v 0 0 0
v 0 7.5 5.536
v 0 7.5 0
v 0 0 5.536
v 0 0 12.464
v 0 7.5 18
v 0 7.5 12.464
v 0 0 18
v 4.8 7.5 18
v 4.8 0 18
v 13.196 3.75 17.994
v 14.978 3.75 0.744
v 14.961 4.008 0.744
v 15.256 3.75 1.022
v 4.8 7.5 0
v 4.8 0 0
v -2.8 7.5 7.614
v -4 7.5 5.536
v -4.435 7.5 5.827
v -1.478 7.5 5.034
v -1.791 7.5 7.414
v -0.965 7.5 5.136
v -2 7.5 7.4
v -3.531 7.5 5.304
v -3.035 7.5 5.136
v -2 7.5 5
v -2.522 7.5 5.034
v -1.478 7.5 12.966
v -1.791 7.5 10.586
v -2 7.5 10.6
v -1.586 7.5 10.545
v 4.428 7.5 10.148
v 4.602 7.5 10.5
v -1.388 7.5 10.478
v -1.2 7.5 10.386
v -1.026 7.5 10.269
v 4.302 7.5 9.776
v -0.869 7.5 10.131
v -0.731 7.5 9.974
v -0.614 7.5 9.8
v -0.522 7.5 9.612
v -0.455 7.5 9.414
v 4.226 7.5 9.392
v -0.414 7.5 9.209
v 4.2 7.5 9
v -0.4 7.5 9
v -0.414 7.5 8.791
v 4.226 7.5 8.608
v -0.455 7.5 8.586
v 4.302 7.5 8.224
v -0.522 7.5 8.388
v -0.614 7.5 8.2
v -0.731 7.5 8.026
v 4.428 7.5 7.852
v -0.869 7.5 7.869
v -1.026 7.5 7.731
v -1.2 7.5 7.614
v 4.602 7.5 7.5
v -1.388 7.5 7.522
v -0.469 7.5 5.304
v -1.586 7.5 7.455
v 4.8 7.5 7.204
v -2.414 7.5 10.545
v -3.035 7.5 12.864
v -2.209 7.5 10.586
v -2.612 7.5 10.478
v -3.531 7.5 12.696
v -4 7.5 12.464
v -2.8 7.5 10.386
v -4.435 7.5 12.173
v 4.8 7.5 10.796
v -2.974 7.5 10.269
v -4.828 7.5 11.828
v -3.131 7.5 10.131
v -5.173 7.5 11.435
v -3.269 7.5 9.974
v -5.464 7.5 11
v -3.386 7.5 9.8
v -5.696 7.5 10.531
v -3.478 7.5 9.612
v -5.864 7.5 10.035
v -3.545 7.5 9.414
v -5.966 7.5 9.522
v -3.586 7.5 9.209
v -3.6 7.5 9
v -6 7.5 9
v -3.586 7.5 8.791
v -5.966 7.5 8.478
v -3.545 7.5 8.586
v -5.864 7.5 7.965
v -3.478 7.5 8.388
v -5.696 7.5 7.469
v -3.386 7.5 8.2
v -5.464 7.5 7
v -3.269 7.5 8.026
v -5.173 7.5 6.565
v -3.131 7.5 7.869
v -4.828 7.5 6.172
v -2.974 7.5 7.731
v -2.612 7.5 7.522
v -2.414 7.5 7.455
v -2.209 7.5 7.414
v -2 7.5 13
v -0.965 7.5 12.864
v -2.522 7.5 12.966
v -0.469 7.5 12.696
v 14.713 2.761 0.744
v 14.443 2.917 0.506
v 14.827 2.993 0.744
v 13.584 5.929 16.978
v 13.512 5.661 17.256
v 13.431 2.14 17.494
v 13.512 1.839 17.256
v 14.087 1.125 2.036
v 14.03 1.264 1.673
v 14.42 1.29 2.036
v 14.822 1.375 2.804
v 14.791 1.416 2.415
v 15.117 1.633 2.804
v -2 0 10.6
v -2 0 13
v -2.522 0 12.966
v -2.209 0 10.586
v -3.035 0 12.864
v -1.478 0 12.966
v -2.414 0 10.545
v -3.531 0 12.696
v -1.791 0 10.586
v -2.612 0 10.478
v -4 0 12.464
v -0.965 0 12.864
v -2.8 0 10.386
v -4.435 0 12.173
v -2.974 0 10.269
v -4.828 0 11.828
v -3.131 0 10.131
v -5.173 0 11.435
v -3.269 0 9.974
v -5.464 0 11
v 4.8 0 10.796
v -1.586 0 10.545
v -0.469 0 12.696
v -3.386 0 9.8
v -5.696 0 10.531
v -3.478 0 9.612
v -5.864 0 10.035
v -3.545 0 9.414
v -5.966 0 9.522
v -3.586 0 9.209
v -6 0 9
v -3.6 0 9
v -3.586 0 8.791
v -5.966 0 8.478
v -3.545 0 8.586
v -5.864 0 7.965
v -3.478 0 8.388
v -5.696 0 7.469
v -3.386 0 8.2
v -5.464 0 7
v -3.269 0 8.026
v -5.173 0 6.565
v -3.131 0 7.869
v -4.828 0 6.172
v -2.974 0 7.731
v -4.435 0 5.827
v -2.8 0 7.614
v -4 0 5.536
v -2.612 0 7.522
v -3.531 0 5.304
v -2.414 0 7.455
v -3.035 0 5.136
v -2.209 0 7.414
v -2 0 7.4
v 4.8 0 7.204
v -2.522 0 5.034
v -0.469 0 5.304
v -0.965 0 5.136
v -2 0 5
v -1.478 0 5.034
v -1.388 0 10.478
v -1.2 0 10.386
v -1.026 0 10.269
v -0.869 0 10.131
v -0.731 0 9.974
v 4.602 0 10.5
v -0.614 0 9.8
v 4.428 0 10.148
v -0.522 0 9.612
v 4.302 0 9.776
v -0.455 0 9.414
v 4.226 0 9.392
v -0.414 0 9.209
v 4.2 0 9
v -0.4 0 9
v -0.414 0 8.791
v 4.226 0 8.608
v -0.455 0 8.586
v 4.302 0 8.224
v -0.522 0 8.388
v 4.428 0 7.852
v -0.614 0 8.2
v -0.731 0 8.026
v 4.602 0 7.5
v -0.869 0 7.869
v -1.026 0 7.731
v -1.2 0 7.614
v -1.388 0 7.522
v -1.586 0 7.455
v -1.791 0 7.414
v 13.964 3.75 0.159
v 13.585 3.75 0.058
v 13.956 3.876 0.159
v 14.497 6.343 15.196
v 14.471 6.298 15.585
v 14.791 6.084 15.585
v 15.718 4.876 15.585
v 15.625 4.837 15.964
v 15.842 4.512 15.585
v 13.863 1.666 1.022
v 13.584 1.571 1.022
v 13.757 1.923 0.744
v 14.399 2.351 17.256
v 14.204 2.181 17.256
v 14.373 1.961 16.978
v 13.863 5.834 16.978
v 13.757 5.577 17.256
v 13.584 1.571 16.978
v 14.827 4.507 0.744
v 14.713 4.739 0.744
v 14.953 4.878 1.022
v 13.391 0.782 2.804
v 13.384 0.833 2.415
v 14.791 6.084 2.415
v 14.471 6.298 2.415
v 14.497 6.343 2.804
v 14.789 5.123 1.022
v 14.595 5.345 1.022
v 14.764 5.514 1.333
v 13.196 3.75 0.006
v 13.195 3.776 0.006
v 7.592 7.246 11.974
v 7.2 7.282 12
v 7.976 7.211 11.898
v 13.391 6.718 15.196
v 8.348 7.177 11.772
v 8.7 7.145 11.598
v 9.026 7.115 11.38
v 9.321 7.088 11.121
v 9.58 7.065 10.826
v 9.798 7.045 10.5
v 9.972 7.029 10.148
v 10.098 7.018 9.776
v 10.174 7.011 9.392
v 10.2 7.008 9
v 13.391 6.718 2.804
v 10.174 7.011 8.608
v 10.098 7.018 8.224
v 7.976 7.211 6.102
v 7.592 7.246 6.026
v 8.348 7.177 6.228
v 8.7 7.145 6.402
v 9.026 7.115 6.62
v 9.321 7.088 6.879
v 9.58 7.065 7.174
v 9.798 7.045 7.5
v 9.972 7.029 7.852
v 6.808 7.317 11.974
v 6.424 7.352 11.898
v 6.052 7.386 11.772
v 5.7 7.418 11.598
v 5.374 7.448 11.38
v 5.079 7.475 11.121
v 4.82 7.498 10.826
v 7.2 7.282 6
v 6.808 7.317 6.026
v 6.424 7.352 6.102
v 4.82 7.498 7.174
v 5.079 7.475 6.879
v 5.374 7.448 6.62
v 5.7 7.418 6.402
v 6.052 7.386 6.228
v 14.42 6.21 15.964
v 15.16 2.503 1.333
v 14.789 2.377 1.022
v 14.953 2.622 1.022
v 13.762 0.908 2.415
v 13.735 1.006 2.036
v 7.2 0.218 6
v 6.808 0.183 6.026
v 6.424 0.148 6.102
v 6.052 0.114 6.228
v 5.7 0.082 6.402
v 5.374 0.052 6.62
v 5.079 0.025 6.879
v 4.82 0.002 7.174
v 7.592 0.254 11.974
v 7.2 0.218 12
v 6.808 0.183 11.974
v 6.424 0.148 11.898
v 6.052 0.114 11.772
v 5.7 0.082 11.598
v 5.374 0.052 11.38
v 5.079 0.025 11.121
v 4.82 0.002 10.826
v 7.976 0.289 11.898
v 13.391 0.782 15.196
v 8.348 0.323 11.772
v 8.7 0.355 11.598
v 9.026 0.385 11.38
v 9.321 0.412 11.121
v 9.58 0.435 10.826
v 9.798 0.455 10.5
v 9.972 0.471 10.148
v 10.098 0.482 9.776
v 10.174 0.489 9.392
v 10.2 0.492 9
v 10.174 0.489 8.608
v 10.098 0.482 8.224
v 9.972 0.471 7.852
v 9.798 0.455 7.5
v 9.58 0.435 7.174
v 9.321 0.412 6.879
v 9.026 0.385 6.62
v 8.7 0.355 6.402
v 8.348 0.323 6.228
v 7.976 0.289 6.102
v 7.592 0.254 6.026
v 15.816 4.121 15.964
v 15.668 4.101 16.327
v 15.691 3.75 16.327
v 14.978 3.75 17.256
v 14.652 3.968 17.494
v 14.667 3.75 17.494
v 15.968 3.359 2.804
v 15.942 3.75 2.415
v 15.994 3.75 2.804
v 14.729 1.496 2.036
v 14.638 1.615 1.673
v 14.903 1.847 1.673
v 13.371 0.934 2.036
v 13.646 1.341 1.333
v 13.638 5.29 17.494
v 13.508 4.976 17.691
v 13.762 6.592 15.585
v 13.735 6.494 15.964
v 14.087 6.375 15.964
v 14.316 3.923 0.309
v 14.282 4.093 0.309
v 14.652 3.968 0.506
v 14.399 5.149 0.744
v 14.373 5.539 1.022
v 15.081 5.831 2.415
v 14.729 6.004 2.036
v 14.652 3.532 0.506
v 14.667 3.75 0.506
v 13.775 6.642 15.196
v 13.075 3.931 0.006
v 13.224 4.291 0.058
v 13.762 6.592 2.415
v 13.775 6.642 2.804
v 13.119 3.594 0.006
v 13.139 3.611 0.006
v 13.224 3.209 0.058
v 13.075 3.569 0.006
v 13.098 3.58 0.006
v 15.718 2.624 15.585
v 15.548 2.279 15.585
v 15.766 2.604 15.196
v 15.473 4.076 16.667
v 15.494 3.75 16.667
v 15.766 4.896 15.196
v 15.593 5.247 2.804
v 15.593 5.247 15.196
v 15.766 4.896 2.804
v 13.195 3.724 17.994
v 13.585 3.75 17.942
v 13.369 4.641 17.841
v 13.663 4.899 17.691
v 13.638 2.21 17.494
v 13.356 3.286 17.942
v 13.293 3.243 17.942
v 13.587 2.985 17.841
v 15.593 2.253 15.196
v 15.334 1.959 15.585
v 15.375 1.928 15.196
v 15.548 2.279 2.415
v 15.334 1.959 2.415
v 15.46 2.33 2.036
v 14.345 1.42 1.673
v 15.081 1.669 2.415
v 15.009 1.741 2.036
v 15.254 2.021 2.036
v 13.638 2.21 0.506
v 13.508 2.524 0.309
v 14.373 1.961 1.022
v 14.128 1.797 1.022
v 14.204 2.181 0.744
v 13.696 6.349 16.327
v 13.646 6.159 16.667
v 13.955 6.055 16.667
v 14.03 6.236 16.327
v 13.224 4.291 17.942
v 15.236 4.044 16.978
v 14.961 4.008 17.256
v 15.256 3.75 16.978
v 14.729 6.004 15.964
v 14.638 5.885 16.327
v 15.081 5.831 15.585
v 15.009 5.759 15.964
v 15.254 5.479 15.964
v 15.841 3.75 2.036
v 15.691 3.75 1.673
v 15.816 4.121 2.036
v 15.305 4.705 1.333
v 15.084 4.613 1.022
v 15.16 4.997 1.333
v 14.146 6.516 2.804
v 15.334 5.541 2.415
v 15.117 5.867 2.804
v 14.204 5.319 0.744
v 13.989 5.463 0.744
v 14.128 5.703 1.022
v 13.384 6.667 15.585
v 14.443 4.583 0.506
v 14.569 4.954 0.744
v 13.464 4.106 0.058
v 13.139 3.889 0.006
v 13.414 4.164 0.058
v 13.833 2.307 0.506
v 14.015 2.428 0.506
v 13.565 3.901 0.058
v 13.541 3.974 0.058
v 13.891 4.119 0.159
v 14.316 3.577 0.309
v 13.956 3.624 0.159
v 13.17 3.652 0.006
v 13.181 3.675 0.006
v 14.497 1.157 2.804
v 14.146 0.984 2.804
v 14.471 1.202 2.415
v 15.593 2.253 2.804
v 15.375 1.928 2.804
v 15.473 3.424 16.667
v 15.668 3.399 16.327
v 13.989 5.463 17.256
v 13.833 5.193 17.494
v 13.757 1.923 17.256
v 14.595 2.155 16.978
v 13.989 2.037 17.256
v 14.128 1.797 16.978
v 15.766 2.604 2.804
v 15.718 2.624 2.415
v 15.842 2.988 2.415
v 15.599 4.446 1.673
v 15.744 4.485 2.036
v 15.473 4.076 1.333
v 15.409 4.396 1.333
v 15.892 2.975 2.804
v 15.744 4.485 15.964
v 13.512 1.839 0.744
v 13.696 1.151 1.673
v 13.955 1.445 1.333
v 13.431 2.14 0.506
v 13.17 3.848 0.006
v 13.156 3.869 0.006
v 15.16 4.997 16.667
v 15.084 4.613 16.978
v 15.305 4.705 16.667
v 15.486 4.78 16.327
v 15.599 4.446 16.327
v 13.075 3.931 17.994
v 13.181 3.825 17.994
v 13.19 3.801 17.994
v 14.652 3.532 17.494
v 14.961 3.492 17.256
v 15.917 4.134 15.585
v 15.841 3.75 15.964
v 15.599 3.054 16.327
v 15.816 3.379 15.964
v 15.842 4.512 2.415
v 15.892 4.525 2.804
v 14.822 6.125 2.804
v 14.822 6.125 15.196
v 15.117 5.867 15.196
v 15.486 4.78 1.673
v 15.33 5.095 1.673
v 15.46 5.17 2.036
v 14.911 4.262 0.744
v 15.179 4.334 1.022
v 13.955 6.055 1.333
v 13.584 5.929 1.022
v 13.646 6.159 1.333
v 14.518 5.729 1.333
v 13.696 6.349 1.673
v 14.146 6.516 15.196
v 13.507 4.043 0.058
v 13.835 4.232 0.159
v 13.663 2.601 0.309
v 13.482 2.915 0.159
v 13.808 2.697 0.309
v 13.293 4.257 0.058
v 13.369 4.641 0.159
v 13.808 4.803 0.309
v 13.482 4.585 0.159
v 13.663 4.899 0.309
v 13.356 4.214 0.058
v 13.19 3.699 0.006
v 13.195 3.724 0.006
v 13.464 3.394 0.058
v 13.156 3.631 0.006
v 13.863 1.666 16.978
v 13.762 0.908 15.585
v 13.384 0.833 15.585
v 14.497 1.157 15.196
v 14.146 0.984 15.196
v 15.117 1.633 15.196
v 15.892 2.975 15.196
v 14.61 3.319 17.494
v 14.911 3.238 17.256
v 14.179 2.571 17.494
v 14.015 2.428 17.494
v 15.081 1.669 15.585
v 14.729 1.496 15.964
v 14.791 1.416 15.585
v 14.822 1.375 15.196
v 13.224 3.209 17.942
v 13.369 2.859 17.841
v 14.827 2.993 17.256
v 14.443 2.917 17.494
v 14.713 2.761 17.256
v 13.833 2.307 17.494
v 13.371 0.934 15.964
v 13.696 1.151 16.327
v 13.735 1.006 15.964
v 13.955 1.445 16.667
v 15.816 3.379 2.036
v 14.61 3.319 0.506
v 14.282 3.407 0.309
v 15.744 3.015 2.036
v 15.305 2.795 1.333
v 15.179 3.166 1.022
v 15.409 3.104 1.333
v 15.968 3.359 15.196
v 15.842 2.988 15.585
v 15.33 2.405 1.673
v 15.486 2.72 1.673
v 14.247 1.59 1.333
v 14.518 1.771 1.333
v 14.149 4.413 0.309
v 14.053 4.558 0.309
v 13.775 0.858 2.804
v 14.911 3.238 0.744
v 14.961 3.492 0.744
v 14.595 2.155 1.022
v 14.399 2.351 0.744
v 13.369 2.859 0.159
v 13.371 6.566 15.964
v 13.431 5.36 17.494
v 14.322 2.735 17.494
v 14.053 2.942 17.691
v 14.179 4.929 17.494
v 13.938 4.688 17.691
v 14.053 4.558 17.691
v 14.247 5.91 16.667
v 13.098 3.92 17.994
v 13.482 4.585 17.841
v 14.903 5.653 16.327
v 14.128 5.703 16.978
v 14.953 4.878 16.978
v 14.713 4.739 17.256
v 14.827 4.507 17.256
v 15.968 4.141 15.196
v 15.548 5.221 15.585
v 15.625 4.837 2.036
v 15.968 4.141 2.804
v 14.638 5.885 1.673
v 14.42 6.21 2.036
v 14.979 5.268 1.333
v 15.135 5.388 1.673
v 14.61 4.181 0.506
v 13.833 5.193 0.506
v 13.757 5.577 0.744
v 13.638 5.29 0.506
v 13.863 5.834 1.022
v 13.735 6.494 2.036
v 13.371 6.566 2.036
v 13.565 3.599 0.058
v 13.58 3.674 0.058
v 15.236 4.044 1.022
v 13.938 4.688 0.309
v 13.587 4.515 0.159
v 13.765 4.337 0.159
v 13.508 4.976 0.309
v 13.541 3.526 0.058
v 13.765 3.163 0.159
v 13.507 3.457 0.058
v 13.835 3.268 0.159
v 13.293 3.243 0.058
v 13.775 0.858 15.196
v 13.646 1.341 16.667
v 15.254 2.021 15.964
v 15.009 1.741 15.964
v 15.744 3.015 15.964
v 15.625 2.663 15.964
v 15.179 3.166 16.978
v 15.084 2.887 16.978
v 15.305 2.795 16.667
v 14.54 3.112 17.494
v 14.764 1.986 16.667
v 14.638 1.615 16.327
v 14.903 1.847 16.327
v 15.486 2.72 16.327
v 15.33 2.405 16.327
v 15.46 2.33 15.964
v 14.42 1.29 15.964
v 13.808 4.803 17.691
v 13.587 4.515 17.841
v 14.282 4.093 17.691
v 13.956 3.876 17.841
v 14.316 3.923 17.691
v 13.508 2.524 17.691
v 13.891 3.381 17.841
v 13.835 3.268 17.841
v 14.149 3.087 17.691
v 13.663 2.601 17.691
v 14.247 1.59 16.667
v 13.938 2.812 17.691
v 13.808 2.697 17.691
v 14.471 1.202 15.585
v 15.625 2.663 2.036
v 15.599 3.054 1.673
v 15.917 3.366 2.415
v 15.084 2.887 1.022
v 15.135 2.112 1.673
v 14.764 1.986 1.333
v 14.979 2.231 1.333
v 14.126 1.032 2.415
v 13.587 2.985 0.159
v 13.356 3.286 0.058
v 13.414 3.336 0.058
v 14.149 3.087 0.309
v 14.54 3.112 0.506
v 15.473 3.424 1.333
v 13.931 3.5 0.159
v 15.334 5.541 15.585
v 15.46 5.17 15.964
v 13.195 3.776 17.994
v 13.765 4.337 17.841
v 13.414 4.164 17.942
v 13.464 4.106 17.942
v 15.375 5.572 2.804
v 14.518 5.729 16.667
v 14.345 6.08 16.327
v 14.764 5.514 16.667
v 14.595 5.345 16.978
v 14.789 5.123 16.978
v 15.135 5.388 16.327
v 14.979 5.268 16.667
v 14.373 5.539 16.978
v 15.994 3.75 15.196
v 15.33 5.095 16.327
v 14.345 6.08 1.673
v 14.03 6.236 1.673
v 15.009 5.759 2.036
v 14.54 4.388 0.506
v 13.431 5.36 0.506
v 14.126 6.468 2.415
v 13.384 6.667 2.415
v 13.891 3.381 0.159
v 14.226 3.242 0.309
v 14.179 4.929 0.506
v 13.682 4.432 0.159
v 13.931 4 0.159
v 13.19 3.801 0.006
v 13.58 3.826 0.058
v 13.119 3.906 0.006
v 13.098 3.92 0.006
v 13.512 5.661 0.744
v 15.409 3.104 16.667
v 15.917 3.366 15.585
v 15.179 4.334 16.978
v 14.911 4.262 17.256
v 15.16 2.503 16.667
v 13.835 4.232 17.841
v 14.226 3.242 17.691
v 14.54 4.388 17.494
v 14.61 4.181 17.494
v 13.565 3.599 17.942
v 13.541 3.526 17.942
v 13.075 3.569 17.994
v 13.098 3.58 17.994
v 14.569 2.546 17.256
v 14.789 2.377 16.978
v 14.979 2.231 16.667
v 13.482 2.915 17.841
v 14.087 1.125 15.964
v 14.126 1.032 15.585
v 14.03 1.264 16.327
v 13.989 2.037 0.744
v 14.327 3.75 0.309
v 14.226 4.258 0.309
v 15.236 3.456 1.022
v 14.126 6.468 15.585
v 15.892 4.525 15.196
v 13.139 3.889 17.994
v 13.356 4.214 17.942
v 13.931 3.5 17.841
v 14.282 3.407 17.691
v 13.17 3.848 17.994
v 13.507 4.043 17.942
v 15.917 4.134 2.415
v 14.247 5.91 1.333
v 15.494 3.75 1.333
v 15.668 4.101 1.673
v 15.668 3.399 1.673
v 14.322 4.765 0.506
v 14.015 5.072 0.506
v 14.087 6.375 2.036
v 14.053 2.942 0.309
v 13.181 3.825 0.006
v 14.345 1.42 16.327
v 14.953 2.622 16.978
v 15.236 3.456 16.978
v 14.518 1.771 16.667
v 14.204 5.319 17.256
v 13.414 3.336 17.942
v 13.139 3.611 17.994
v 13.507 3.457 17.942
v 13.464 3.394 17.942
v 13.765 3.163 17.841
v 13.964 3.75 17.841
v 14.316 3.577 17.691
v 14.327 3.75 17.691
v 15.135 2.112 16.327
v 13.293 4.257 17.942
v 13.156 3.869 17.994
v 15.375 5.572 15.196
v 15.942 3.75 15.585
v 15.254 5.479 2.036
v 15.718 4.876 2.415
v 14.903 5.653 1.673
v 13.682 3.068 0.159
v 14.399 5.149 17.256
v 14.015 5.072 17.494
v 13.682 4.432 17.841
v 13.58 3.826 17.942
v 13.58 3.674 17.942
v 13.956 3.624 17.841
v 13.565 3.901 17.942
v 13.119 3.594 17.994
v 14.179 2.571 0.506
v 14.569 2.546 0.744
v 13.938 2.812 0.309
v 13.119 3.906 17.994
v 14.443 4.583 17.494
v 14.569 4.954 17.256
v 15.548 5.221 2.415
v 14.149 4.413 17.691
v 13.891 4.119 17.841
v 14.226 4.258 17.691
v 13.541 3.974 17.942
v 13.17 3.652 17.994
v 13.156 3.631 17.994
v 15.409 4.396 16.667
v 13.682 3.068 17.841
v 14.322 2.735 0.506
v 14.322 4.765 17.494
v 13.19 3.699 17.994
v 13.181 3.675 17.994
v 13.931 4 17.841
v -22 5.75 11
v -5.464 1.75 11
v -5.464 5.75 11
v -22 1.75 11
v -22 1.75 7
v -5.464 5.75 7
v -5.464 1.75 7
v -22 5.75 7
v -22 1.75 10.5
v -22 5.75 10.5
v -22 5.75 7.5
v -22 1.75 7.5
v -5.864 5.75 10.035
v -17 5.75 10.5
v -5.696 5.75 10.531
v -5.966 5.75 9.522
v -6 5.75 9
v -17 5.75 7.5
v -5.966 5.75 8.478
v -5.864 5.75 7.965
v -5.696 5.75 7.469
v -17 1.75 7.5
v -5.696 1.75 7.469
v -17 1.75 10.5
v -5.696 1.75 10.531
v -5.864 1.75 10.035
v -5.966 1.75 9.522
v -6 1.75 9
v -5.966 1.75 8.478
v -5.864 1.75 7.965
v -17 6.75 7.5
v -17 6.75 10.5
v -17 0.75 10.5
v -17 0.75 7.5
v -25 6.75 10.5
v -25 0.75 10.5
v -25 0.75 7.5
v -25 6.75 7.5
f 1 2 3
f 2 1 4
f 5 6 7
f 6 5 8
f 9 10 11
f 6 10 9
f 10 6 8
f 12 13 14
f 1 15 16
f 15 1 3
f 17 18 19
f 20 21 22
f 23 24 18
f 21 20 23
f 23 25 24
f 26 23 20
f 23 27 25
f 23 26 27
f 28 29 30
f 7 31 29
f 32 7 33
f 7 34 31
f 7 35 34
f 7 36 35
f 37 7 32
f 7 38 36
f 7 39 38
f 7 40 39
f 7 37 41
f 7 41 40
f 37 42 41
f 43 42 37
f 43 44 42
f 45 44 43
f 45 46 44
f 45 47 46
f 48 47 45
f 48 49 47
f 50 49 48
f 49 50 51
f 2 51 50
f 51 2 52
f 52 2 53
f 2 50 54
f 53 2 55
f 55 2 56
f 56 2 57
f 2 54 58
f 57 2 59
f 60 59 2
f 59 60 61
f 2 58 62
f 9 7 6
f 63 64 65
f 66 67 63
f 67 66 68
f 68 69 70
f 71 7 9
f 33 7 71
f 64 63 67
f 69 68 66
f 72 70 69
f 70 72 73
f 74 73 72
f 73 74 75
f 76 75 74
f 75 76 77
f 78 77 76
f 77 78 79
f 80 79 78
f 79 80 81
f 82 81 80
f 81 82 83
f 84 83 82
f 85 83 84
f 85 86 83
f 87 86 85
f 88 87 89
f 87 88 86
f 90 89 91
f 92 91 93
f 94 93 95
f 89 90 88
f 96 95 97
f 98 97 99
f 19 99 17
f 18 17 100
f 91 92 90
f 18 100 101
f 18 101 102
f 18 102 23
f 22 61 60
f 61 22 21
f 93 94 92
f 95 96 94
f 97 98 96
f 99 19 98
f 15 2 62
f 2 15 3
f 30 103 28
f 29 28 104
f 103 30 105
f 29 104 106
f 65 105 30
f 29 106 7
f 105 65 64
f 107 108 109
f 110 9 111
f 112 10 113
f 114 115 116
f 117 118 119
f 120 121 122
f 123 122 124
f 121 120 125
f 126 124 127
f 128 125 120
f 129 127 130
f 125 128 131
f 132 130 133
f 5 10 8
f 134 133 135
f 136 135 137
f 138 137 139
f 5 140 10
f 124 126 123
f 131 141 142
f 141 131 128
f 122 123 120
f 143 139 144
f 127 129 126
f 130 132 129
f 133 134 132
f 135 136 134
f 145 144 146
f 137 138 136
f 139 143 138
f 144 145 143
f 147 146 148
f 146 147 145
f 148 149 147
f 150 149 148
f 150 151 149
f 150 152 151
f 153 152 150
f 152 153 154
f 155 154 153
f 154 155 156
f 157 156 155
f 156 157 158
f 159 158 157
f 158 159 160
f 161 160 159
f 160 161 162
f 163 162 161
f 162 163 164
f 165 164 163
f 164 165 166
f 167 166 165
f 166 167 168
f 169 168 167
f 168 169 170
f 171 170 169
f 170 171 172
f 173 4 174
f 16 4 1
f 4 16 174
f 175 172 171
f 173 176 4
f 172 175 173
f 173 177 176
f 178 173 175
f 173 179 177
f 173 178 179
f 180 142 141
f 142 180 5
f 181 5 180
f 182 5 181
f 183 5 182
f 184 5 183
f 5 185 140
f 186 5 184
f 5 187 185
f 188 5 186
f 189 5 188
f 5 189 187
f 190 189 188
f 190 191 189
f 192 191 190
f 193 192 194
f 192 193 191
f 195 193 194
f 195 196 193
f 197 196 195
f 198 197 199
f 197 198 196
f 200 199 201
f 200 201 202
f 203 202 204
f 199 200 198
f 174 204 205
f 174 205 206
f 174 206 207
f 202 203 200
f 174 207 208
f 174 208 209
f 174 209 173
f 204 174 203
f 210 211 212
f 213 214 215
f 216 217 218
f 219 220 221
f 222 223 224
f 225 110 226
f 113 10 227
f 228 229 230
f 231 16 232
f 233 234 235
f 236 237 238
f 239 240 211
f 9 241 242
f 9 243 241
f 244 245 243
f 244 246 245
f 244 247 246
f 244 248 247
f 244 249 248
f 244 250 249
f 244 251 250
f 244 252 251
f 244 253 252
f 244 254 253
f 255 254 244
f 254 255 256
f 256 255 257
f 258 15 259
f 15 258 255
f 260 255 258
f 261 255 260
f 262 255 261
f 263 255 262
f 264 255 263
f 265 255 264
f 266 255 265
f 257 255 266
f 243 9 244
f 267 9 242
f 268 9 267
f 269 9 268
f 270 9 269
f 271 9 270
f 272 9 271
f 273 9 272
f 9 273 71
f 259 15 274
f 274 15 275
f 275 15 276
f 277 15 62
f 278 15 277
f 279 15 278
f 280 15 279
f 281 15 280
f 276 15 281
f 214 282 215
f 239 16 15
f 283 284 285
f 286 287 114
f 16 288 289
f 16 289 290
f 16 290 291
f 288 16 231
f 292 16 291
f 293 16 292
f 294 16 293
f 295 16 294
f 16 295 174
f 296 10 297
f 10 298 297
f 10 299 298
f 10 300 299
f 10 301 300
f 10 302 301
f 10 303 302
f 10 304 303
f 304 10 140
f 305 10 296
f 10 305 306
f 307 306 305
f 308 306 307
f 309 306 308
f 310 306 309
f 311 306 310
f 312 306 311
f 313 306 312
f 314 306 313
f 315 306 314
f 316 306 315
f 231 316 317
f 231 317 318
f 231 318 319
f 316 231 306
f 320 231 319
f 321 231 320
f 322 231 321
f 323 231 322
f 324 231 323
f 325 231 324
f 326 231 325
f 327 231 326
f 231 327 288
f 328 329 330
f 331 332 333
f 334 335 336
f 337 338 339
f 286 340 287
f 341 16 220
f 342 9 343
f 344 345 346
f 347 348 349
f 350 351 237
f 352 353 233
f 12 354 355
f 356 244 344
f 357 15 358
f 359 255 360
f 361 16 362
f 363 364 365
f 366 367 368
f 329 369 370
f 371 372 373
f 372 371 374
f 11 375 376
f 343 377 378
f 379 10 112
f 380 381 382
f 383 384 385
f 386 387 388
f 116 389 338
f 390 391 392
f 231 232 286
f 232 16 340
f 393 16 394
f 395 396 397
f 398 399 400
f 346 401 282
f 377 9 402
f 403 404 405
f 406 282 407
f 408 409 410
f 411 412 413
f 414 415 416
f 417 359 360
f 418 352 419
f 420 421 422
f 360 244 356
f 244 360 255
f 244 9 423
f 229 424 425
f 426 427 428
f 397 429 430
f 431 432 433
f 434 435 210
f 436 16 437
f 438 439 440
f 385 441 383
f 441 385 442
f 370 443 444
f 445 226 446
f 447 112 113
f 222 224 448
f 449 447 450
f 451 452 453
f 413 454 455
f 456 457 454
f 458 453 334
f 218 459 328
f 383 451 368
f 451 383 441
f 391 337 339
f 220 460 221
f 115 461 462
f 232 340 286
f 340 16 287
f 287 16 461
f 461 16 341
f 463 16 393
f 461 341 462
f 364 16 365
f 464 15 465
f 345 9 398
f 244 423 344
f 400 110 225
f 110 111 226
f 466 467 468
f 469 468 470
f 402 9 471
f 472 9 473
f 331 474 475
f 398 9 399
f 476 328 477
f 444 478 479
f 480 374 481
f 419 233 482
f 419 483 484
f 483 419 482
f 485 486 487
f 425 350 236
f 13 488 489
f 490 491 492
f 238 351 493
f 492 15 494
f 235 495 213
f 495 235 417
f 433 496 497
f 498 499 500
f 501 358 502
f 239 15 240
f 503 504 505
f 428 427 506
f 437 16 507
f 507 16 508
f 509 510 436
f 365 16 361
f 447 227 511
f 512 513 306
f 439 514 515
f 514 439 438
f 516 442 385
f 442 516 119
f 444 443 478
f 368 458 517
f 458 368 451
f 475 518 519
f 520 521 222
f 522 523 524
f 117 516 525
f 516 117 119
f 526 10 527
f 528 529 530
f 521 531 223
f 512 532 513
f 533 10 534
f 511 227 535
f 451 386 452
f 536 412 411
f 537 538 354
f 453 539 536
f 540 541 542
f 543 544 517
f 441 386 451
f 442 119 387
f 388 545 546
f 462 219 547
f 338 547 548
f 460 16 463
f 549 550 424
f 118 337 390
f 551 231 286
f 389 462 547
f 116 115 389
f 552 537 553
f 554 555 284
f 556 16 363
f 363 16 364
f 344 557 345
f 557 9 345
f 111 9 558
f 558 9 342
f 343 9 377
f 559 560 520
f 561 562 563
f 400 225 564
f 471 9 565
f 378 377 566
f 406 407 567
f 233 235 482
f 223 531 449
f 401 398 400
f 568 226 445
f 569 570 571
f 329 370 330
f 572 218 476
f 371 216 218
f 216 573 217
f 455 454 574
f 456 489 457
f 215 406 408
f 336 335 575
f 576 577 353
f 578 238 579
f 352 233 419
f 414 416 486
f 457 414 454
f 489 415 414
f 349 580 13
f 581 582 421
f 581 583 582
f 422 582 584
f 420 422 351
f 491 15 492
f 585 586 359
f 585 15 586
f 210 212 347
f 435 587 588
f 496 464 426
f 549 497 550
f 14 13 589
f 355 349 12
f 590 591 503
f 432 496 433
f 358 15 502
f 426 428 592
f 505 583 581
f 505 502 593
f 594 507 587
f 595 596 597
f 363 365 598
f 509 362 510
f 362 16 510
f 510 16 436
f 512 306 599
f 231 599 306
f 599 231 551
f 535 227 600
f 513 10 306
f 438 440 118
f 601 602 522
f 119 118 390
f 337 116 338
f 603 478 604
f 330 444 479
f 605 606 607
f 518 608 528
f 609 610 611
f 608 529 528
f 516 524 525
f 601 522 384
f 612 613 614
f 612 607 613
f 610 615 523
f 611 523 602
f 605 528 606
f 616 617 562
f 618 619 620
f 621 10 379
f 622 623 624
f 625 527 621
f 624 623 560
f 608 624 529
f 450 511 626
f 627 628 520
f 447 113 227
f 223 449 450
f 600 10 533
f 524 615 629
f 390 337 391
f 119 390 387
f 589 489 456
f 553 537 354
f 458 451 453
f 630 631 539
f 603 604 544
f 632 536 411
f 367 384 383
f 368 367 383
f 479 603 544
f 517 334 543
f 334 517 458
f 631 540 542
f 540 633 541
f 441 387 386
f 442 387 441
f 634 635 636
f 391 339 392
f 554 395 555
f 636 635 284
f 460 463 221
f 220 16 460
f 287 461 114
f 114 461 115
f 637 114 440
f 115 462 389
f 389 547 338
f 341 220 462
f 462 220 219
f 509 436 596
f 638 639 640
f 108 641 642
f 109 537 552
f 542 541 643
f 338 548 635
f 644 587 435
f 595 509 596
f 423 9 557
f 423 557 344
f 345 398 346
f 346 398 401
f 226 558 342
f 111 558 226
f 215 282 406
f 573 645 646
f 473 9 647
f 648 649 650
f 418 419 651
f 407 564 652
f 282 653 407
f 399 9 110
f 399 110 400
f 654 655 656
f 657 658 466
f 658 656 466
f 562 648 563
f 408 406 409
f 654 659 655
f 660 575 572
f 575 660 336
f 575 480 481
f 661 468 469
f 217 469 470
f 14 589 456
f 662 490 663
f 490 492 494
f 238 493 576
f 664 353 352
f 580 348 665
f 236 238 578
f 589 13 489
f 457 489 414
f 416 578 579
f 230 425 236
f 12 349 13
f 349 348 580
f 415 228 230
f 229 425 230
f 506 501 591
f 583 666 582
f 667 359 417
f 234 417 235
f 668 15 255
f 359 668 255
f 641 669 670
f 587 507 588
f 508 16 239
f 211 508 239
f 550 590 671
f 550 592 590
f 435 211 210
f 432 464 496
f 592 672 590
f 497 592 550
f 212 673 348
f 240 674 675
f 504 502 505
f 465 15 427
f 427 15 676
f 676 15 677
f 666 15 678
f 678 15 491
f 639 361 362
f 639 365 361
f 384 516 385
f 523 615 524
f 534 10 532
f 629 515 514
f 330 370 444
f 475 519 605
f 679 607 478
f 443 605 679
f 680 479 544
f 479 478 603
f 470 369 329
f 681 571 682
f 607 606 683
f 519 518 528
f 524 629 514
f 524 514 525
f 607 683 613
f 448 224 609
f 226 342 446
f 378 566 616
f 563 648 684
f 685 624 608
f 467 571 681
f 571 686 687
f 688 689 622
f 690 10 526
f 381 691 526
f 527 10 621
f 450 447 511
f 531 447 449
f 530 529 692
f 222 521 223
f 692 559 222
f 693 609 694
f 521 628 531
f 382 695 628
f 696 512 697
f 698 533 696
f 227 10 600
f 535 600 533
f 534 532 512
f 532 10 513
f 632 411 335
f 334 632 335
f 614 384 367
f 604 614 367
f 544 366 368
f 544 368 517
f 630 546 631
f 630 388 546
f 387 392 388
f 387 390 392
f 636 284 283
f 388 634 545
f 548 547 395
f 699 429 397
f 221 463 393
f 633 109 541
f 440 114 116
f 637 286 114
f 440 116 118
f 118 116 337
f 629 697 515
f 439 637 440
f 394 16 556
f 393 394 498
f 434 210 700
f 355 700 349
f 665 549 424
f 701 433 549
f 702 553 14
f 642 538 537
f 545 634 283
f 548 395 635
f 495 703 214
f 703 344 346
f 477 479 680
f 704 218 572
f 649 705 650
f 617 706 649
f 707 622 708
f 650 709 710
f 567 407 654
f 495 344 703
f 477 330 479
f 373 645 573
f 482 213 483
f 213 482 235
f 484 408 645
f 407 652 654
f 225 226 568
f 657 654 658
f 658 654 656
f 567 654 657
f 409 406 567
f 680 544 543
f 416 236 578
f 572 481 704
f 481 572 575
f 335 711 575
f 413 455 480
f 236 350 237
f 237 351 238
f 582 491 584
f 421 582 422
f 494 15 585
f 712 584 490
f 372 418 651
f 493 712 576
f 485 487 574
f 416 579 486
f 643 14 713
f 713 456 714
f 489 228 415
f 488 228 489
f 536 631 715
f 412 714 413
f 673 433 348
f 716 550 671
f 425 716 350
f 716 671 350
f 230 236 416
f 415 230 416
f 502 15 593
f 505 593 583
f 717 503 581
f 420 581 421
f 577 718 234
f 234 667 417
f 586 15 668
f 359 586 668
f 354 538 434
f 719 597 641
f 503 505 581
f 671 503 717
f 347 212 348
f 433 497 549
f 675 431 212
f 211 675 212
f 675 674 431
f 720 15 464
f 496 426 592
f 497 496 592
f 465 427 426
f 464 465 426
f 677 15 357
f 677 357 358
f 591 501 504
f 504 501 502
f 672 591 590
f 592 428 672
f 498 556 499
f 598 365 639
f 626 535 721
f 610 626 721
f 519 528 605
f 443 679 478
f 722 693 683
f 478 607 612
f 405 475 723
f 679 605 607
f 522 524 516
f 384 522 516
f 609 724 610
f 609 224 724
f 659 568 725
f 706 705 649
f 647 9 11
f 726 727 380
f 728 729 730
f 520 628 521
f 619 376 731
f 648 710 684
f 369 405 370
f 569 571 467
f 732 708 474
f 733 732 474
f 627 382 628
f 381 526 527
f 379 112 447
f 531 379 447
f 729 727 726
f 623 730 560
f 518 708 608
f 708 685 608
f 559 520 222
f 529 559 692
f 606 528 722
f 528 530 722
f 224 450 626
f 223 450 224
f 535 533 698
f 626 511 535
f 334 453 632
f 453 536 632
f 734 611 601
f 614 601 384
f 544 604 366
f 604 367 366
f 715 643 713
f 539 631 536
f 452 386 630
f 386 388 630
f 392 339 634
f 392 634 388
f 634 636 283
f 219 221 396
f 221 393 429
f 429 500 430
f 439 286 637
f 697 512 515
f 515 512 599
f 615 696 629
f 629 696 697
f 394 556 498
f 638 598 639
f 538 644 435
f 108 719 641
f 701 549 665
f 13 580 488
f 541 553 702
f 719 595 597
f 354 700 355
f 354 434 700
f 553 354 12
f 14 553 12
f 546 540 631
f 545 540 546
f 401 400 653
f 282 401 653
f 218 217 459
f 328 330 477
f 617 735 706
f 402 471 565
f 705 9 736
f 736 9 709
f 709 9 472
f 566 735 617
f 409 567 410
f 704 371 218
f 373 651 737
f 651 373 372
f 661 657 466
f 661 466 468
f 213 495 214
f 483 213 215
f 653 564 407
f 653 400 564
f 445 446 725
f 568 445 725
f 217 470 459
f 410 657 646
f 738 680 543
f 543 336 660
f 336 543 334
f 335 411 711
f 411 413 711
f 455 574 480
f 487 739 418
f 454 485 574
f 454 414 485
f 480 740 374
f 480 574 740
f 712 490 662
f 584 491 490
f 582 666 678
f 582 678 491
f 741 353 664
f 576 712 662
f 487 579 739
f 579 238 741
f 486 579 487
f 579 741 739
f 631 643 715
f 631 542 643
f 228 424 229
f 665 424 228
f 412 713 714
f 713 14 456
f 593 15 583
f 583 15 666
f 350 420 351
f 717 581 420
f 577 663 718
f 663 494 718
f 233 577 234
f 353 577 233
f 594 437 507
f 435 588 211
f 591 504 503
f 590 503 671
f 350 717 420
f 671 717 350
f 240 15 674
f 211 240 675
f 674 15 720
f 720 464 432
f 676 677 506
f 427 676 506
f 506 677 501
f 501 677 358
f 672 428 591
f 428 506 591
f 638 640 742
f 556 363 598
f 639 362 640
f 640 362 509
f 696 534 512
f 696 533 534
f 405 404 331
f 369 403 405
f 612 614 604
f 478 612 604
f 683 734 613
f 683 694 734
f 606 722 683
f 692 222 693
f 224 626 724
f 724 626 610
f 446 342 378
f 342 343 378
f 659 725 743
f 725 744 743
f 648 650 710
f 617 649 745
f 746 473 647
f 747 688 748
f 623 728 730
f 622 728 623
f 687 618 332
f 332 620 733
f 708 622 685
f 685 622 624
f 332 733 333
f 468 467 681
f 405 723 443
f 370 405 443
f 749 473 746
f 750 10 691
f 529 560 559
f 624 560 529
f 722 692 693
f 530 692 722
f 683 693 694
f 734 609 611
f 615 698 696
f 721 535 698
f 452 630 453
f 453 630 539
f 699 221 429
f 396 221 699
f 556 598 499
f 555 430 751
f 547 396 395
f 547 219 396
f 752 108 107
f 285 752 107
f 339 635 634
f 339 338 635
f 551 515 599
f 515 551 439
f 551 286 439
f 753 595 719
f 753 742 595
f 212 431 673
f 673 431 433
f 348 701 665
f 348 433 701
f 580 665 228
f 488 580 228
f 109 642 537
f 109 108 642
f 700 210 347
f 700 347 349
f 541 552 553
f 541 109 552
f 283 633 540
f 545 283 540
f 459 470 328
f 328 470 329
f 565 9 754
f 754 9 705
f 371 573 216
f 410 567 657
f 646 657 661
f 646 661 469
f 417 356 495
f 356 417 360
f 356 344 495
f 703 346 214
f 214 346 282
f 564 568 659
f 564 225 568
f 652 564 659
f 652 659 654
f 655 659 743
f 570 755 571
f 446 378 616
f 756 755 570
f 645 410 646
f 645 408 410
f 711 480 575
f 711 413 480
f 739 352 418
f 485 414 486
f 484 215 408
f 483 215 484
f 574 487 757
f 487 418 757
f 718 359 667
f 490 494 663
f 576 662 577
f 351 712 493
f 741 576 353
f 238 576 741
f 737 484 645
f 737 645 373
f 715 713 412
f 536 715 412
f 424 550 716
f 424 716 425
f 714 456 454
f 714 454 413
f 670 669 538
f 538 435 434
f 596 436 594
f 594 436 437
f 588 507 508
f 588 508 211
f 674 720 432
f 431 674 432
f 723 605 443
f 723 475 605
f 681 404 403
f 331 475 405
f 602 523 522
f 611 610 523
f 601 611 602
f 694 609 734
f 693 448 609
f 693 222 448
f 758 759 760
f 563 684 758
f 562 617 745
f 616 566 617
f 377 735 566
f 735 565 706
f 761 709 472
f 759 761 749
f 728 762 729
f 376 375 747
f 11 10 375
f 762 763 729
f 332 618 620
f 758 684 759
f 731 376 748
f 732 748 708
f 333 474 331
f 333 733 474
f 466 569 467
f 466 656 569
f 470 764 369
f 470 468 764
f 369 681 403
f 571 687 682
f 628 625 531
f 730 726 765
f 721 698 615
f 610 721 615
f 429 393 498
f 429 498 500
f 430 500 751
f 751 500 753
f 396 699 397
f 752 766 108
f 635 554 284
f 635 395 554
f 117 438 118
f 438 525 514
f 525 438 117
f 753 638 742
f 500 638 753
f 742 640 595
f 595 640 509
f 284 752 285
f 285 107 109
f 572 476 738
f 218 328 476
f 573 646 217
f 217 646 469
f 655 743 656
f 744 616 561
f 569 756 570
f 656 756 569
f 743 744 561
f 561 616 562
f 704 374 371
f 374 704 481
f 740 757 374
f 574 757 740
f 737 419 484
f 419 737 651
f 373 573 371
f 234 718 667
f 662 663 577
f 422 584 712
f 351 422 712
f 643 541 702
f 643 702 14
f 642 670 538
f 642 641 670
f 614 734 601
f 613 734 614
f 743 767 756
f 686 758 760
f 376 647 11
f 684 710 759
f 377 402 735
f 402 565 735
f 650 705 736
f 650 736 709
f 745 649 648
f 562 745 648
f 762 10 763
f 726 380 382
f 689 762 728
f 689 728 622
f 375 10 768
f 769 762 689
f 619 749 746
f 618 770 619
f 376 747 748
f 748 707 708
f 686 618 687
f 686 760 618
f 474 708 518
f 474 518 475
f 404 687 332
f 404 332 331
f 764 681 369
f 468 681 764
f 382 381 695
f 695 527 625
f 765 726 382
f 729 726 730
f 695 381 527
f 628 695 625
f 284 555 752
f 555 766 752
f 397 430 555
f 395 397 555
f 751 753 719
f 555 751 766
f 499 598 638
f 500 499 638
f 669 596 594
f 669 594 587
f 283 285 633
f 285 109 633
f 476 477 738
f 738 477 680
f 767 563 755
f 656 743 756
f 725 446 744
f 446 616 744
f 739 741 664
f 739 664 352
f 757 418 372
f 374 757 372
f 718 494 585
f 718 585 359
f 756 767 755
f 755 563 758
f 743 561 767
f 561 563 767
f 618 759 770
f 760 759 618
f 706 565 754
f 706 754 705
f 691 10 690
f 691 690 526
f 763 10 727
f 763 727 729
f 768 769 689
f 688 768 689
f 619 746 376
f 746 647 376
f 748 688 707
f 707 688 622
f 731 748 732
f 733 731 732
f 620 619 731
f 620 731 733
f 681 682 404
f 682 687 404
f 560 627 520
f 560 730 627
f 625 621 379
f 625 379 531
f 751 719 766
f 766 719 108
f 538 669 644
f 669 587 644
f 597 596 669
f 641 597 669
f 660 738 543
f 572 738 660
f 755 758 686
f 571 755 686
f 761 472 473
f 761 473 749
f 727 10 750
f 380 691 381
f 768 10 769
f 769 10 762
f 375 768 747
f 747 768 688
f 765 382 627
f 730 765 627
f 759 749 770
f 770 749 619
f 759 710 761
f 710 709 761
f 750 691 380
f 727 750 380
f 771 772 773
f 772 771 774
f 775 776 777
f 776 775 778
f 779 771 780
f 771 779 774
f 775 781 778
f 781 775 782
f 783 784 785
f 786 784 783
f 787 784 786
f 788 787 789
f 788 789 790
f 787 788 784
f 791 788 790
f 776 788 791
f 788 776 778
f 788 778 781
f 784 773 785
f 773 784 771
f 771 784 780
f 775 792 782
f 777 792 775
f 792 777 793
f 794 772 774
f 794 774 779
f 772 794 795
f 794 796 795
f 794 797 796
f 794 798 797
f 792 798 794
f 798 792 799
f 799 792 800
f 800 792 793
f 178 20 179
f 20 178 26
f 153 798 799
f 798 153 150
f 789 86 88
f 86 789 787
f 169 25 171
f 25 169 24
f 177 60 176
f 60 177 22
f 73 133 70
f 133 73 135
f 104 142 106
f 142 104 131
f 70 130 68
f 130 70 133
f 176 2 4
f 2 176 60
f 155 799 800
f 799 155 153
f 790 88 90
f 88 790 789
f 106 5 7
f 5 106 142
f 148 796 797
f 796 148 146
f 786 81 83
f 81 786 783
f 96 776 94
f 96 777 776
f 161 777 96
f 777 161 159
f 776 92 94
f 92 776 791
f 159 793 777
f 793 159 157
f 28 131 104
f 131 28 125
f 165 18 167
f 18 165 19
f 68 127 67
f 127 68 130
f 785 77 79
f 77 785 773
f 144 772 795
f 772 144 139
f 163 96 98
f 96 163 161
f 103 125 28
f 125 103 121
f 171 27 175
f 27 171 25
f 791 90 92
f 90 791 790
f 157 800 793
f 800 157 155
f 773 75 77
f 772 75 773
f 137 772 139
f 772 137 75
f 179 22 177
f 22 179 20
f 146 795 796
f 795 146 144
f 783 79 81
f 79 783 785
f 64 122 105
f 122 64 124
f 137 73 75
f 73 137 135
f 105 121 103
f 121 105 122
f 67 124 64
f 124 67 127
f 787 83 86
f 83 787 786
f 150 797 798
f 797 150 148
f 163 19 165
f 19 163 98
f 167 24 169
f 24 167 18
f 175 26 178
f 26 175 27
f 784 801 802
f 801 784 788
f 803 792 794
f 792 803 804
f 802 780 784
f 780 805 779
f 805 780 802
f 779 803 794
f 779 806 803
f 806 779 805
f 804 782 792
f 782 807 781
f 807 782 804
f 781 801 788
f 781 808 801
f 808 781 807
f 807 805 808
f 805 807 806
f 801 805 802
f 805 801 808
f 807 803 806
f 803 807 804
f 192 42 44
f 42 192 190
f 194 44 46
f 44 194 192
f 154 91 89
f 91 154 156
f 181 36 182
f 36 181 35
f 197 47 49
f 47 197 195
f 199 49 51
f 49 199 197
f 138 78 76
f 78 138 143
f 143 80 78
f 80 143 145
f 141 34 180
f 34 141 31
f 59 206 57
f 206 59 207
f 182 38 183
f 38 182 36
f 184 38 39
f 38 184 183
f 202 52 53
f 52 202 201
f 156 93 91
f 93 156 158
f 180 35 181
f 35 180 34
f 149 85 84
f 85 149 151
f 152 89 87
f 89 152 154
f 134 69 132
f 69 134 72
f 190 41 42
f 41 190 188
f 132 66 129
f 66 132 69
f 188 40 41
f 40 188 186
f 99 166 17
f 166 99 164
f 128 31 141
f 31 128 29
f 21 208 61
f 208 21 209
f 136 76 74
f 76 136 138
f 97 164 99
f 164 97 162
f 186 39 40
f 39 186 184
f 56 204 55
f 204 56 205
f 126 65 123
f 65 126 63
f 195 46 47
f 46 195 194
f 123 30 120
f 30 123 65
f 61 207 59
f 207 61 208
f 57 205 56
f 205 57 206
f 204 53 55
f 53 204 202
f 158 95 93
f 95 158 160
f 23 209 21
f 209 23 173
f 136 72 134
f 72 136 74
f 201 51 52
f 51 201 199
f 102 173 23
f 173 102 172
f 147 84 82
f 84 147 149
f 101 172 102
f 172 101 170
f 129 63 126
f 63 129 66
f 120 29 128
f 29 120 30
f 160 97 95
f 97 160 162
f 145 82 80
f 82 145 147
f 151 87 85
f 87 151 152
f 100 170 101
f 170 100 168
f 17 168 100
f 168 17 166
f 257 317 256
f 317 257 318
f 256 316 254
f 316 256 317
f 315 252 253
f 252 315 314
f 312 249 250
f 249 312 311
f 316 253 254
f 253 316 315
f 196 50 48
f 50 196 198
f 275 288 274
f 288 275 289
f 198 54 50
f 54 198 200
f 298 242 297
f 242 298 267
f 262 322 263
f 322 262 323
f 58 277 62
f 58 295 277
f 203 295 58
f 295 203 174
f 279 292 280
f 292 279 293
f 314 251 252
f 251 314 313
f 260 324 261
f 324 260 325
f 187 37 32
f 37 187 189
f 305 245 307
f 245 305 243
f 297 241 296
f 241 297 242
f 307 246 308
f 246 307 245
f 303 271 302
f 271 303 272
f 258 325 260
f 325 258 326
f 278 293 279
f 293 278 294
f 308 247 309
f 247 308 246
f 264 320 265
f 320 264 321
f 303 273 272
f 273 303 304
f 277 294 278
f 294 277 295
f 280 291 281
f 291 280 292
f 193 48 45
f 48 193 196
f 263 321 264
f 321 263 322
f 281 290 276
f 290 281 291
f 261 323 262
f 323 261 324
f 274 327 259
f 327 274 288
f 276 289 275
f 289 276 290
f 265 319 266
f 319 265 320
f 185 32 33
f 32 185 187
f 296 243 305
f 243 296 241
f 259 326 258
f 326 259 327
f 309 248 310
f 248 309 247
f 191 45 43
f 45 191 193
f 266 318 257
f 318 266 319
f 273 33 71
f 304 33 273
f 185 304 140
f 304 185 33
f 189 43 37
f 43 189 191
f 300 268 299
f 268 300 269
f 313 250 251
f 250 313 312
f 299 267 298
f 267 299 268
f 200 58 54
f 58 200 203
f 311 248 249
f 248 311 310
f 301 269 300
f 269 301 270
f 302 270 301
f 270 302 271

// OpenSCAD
// ORIGINAL TechHand/PRINT trainer CAD v0 — training tool only
// Trigger lever — presses a momentary switch. Pivot hole for M3.
// Blade finger pad ~15–20 mm; travel ~3–5 mm to switch. NOT a firearm trigger geometry copy.

/* ===== PARAMETERS ===== */
blade_w = 7.5;             // thickness into grip (mm)
blade_h = 18;              // finger pad height (mm)
blade_len = 16;            // forward finger pad length (mm)
arm_len = 22;              // lever arm from pivot to switch pad (mm)
arm_t = 4.0;               // arm thickness (mm)
pivot_d = 3.2;             // M3 clearance
pivot_boss_od = 8.0;
switch_pad = [8, 6, 3];    // pad that presses momentary switch
travel_hint = 4;           // design travel ~3–5 mm (document)
$fn = 48;

module trigger_lever() {
    difference() {
        union() {
            // Finger blade / pad — rounded trainer blade
            hull() {
                translate([0, 0, 0])
                    cube([blade_len * 0.3, blade_w, blade_h]);
                translate([blade_len - 3, blade_w/2, 3])
                    sphere(r=3);
                translate([blade_len - 3, blade_w/2, blade_h - 3])
                    sphere(r=3);
            }
            // Lever arm rearward to switch
            translate([-arm_len, (blade_w - arm_t)/2, blade_h/2 - arm_t/2])
                cube([arm_len + 2, arm_t, arm_t]);
            // Pivot boss
            translate([-2, blade_w/2, blade_h/2])
                rotate([90, 0, 0])
                    cylinder(h=blade_w, d=pivot_boss_od, center=true);
            // Switch press pad at end of arm
            translate([-arm_len - switch_pad[0]/2 + 1, (blade_w - switch_pad[1])/2, blade_h/2 - switch_pad[2]/2])
                cube(switch_pad);
        }
        // Pivot hole M3
        translate([-2, blade_w/2, blade_h/2])
            rotate([90, 0, 0])
                cylinder(h=blade_w + 2, d=pivot_d, center=true);
        // Finger groove comfort
        translate([blade_len * 0.45, -0.1, blade_h/2])
            rotate([-90, 0, 0])
                cylinder(h=blade_w + 0.2, d=6);
    }
}

trigger_lever();
